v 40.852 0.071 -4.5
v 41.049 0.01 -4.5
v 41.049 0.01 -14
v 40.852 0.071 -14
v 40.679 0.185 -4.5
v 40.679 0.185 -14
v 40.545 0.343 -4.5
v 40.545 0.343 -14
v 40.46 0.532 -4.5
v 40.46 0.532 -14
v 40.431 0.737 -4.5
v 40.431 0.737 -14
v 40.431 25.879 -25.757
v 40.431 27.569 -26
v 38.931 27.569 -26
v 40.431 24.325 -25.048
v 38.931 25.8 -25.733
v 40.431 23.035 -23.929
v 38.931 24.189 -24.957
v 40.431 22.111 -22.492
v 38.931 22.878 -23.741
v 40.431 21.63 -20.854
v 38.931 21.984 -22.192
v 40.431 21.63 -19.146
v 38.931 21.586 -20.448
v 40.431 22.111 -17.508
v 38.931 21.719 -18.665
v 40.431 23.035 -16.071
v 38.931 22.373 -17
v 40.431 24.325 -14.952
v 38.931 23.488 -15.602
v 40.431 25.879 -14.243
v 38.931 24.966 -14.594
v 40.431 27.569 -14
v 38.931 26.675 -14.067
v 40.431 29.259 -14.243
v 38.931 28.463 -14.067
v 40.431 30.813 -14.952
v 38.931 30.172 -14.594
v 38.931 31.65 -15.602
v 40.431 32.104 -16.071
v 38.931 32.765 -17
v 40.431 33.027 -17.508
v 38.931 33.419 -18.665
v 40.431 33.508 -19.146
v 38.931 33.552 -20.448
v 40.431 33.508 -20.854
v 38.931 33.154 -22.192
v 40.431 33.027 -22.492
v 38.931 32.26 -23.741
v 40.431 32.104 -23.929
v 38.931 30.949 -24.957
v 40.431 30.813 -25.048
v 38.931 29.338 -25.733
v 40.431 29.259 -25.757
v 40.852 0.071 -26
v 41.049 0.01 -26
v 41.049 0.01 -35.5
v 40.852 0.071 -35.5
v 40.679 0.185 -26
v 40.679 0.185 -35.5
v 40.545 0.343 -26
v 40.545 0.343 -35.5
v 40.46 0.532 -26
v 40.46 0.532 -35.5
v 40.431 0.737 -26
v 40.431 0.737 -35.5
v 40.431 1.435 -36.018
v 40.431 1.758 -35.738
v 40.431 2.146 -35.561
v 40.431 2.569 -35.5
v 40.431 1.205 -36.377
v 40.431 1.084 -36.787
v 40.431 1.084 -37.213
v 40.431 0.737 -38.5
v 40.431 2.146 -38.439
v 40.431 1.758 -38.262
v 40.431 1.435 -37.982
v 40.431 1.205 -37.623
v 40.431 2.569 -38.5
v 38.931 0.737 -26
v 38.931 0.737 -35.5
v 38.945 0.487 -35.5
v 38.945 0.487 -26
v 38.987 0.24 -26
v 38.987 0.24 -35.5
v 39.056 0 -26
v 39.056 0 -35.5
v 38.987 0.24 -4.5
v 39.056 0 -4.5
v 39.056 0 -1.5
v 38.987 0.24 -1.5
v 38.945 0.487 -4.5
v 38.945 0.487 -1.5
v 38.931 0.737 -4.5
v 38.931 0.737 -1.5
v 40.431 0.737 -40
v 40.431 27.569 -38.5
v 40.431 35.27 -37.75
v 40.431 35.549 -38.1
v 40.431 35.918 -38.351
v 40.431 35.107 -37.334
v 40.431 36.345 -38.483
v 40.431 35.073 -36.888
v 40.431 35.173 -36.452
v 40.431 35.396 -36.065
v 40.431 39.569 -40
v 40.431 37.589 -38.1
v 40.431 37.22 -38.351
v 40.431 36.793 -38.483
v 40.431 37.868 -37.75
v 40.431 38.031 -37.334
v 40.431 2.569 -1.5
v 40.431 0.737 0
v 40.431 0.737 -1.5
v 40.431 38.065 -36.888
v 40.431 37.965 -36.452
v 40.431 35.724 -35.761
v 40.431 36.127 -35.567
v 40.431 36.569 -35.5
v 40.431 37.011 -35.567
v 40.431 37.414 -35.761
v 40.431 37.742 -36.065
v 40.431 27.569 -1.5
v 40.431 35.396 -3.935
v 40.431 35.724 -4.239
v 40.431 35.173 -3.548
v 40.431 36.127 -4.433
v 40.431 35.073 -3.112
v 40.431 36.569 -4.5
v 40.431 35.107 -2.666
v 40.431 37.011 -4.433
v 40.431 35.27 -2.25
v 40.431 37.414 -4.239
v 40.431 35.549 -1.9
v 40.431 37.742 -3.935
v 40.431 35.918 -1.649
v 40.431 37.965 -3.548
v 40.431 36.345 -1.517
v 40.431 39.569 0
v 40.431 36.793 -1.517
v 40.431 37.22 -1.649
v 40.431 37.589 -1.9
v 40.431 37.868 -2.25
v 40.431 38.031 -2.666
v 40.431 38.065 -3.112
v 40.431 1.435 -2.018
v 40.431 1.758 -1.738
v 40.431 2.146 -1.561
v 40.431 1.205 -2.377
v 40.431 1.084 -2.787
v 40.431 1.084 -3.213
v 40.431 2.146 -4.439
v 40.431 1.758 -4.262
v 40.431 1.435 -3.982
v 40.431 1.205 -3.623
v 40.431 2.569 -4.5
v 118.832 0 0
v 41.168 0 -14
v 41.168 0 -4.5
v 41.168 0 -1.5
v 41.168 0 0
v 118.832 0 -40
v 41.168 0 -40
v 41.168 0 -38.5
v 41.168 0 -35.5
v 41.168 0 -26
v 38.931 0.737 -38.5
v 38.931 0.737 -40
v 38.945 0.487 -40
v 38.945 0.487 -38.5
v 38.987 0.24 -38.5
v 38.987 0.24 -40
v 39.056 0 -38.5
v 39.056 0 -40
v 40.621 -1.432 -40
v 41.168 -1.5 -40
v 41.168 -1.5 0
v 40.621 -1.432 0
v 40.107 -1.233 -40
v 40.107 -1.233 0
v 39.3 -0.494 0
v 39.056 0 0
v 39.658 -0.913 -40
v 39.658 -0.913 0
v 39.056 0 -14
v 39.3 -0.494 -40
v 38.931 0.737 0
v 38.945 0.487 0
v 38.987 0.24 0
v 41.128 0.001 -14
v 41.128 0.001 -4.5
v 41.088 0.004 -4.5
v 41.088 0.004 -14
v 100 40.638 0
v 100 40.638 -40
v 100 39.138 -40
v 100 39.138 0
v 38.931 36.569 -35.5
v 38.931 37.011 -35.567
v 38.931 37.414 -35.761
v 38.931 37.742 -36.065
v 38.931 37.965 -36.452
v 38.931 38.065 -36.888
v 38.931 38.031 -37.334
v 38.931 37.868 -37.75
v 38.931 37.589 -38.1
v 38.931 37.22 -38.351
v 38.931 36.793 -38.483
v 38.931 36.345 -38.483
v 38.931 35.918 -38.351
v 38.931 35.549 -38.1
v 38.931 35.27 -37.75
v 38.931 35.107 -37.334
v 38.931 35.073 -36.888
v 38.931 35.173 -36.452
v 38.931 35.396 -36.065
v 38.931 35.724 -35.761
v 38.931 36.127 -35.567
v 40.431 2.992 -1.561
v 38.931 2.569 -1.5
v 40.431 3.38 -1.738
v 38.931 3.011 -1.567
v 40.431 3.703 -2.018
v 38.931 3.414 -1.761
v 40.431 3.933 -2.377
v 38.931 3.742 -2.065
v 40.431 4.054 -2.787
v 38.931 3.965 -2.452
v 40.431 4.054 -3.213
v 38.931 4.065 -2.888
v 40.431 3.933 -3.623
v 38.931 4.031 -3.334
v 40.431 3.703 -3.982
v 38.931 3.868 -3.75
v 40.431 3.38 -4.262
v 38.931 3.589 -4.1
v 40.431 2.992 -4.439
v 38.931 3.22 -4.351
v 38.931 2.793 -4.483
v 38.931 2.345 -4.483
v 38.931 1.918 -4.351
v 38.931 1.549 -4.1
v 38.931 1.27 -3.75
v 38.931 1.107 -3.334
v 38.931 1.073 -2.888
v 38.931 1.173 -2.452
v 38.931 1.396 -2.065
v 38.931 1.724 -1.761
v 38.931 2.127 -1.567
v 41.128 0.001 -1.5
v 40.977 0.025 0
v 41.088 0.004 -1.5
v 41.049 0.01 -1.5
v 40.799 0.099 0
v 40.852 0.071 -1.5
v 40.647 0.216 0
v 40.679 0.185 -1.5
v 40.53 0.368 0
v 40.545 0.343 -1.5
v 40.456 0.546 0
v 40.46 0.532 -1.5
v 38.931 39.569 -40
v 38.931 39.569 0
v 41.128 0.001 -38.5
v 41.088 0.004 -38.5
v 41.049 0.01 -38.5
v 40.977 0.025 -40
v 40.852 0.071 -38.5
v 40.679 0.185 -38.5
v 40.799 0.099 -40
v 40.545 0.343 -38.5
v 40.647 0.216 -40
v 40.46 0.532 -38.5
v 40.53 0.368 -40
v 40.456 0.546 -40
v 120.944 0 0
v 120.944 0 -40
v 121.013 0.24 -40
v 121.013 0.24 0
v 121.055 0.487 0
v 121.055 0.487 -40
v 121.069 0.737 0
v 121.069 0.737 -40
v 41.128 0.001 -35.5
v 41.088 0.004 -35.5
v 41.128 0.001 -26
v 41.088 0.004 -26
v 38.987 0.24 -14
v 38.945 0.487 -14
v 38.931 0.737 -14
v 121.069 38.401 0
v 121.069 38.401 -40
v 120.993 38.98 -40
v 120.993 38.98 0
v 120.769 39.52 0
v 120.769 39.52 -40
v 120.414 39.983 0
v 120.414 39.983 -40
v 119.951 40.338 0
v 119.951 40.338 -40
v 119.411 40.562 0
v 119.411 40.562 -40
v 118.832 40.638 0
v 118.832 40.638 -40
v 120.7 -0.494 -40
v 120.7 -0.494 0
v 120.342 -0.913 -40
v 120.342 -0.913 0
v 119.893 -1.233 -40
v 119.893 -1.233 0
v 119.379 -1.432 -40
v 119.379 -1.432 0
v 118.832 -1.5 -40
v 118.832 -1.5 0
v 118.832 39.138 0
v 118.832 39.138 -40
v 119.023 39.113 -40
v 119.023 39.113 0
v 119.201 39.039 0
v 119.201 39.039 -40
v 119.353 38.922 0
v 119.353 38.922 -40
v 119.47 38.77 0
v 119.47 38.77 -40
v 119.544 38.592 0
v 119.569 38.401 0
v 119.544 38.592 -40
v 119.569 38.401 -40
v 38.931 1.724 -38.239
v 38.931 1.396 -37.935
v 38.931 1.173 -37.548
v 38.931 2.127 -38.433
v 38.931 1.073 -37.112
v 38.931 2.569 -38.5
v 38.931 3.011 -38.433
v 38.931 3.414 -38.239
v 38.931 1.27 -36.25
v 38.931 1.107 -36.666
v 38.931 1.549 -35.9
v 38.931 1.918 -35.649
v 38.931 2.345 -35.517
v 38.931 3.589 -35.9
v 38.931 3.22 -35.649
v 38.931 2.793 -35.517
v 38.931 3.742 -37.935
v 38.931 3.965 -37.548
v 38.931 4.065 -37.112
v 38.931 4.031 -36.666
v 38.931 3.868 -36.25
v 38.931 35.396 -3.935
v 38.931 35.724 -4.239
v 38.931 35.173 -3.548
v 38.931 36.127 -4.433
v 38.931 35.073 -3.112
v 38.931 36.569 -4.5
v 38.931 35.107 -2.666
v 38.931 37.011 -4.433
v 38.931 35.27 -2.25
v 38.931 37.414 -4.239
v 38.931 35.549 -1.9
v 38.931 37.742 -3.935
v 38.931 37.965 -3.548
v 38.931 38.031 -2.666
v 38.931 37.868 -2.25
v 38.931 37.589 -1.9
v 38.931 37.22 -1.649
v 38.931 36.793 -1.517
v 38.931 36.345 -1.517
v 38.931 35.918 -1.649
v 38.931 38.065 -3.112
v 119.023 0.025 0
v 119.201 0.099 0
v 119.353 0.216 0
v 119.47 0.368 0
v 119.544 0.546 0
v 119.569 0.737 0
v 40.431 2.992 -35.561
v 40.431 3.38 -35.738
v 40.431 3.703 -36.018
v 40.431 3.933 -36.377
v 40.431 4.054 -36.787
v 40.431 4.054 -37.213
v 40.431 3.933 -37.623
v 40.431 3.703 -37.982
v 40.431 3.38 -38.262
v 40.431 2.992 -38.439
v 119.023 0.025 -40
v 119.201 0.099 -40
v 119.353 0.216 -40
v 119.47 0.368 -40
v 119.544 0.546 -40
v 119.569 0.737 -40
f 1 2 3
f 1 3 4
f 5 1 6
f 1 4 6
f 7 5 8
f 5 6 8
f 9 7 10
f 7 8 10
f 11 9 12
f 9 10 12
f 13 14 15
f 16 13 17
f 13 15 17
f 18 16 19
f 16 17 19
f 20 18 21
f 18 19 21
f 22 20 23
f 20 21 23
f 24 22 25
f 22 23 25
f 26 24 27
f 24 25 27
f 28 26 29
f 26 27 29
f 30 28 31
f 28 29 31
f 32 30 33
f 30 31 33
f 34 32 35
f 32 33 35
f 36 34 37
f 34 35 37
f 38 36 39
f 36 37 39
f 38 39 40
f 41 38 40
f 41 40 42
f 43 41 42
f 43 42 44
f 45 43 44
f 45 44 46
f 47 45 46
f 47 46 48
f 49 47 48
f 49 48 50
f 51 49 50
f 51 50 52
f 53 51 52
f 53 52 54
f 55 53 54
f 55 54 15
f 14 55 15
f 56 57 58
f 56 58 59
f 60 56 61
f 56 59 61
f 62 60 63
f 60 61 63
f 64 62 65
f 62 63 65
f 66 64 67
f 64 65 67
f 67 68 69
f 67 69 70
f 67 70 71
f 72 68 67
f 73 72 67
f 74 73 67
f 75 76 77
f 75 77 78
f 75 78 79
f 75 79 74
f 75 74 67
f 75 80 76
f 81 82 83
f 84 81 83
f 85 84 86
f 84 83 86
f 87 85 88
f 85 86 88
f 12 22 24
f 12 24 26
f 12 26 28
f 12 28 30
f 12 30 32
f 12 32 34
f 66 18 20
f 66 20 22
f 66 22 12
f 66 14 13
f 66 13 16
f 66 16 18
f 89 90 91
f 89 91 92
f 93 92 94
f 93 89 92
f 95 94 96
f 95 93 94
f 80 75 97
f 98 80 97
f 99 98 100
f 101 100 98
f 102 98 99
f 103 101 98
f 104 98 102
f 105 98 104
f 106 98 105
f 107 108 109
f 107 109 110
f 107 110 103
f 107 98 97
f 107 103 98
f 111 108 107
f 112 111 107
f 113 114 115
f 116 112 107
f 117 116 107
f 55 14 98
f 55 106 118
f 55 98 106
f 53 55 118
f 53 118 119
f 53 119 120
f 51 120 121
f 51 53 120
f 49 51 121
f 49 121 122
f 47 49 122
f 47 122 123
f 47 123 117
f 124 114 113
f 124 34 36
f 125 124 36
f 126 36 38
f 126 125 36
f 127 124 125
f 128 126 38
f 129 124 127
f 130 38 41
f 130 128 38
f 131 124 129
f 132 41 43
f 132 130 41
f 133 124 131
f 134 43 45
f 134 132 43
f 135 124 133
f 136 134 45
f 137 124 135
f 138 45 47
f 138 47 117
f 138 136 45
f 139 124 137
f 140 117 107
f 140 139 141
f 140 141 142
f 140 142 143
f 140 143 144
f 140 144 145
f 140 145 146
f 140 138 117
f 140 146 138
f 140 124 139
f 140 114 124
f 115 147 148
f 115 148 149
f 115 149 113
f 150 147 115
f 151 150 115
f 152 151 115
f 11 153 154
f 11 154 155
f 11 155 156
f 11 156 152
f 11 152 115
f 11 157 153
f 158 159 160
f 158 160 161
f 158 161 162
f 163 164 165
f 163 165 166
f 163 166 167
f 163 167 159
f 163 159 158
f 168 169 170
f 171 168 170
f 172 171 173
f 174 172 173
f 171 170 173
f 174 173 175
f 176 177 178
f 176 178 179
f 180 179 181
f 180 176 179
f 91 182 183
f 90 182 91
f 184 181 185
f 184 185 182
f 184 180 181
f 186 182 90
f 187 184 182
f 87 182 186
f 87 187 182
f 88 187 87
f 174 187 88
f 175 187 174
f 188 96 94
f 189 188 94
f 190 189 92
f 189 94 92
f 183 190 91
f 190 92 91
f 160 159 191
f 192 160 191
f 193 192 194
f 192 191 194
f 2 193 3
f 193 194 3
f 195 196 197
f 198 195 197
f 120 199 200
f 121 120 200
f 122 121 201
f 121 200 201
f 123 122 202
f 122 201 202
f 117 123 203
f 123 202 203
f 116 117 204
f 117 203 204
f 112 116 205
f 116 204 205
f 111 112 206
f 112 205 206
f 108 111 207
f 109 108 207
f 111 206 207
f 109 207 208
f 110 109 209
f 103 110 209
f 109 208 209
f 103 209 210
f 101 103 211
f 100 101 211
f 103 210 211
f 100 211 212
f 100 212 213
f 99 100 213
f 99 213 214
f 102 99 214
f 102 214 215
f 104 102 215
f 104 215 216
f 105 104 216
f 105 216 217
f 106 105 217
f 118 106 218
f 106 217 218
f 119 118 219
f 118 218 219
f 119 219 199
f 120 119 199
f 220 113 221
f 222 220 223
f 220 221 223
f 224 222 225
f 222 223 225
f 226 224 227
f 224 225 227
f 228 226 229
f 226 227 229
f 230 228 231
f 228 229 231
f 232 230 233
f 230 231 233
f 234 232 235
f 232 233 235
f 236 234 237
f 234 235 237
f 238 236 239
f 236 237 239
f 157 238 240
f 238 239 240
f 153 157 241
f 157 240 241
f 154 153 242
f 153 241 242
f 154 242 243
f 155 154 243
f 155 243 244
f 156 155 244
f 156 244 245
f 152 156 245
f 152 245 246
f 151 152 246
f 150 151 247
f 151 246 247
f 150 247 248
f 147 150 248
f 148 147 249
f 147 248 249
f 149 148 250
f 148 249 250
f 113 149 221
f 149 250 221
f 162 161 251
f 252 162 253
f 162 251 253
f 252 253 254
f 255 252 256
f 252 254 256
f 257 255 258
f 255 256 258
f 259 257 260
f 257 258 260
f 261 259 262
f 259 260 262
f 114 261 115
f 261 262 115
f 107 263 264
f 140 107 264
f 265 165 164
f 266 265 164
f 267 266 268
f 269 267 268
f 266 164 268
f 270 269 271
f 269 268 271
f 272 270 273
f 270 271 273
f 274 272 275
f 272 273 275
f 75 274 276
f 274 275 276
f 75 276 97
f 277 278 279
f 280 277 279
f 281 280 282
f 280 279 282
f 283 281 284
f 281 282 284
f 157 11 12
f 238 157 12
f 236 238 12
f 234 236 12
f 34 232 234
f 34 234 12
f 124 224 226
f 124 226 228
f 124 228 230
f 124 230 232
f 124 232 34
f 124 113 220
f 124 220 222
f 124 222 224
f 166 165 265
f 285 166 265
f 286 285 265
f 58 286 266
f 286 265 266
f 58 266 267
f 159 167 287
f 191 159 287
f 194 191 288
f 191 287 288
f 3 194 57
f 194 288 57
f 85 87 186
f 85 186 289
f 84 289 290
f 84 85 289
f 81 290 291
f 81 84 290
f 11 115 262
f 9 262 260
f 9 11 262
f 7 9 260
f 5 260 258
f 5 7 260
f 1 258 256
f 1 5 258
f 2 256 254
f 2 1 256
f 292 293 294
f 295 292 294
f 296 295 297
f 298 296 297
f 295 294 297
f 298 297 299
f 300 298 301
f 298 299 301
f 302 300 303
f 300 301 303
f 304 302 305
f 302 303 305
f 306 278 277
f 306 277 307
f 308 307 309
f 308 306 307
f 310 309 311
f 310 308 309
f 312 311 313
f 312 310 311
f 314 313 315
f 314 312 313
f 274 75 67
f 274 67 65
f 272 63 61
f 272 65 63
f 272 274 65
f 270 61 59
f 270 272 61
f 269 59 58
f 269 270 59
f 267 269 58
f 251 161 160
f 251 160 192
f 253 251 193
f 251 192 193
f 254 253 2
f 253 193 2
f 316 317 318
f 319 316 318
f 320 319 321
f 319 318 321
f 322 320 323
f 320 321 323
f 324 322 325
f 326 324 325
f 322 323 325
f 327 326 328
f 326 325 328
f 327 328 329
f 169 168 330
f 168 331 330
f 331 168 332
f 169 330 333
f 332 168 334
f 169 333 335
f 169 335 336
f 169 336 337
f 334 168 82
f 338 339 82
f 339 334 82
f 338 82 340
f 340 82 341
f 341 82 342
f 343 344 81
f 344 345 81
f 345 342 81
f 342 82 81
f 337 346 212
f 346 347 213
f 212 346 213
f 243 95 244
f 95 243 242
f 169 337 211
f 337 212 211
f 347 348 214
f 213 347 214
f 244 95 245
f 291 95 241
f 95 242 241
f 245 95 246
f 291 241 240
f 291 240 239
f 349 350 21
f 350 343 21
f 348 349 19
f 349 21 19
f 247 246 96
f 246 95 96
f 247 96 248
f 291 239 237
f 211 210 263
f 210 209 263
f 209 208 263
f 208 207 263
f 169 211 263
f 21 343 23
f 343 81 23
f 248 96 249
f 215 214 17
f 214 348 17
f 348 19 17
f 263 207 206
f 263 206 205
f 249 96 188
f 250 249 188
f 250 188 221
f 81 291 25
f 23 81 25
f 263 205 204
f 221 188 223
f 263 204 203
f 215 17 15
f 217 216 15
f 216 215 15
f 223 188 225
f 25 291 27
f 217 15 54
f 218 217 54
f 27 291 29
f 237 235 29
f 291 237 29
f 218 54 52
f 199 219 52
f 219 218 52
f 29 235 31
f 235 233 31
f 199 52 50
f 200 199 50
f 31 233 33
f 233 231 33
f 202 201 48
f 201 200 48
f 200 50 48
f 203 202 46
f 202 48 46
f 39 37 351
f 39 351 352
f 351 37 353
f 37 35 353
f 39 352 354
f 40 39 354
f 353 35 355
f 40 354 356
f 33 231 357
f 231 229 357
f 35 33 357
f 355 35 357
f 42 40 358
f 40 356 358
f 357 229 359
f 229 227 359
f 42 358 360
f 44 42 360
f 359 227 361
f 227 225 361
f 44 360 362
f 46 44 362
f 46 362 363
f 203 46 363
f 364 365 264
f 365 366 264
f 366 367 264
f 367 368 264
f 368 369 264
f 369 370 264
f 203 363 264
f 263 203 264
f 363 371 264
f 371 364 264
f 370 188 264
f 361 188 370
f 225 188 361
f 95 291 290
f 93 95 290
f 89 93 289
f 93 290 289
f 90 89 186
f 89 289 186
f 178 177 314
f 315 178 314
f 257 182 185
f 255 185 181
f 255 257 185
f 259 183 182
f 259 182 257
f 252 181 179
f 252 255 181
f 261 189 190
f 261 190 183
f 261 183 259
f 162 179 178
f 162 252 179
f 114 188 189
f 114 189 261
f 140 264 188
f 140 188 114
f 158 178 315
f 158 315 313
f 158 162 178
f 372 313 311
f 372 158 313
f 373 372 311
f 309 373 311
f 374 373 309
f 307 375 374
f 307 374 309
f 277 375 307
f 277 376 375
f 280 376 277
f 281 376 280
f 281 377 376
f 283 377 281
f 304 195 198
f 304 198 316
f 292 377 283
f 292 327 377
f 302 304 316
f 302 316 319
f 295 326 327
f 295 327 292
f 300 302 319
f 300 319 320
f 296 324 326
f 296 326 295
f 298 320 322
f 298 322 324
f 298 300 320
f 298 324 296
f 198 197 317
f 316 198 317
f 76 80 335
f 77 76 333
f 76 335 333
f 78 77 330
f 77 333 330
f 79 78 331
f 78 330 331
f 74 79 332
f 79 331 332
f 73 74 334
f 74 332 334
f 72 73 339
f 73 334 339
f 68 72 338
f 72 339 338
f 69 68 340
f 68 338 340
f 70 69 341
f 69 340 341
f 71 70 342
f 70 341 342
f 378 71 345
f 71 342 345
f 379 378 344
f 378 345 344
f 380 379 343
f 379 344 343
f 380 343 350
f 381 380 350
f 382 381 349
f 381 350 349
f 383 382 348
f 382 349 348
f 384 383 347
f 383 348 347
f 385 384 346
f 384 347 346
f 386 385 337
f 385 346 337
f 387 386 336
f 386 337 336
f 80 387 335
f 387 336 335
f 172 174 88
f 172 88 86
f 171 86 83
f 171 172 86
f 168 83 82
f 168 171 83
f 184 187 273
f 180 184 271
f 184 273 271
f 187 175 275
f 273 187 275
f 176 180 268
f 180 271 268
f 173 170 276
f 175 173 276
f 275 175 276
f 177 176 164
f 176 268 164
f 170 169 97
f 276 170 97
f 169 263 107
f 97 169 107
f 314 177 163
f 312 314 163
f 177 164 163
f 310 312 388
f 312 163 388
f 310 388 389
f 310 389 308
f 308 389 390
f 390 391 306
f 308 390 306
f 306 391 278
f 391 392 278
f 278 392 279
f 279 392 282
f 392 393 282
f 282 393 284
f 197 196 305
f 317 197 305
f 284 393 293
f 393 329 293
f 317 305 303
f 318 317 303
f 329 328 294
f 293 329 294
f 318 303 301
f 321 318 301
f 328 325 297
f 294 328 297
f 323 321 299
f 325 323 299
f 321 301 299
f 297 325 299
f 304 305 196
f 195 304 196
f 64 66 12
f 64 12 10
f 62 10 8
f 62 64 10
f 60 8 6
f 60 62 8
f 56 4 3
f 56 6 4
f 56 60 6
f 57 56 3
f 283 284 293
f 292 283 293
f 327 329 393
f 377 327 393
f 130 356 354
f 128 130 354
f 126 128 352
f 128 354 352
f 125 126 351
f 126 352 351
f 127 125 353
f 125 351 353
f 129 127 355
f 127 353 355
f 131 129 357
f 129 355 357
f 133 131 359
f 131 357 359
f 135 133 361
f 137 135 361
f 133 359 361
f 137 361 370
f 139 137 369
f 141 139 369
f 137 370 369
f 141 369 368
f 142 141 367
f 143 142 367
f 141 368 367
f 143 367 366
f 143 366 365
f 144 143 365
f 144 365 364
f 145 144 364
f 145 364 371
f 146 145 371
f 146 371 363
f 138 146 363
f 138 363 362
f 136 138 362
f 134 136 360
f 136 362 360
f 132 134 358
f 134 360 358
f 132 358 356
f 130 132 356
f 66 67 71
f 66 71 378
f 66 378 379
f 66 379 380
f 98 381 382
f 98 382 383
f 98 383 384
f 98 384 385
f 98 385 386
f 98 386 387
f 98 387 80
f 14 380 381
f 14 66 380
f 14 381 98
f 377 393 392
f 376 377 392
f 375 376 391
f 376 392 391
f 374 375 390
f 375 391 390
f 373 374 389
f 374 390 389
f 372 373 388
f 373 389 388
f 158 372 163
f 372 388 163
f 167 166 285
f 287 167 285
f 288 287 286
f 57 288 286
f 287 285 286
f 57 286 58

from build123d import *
from build123d.topology import SkipClean

# Parameters (mm, degrees)
SKETCH1_R               = 6
SKETCH1_R_2             = 1.5
BASE_FLANGE2_DEPTH      = 1.5
SKETCHED_START          = -40
SKETCHED_BEND1_DEPTH    = 40
SKETCHED_BEND1_2_DEPTH  = 40
SKETCHED_START_2        = -35.4999999
SKETCHED_BEND1_3_DEPTH  = 9.4999998
SKETCHED_START_3        = -13.9999999
SKETCHED_BEND1_4_DEPTH  = 9.4999998
SKETCHED_BEND1_5_DEPTH  = 1.4999999
SKETCHED_START_4        = -1.4999999
SKETCHED_BEND1_6_DEPTH  = 1.4999999
SKETCHED_START_5        = 38.93097291
SKETCHED_BEND1_7_DEPTH  = 1.5
SKETCHED_START_6        = 40.43097291
SKETCHED_BEND1_8_DEPTH  = 0.618240168
SKETCHED_START_7        = -38.5000001
SKETCHED_BEND1_9_DEPTH  = 37.00000011
SKETCHED_BEND1_10_DEPTH = 37.00000011


with BuildPart() as part:
    # Base-Flange2: sheet metal written as solids
    # Sketch1 → Base-Flange2 (new body)
    with BuildSketch(Plane(origin=(0, 0, 0), x_dir=(1, 0, 0), z_dir=(0, 1, 0))):
        Polygon((0, 0), (40, 0), (120, 0), (160, 0), (180, 0), (180, 40), (160, 40), (120, 40), (40, 40), (0, 40), align=None)
        with Locations(Location((12, 20, 0), (0, 0, 270))):
            Circle(SKETCH1_R, mode=Mode.SUBTRACT)
        with Locations(Location((3, 37, 0), (0, 0, 270))):
            Circle(SKETCH1_R_2, mode=Mode.SUBTRACT)
        with Locations(Location((37, 37, 0), (0, 0, 270))):
            Circle(SKETCH1_R_2, mode=Mode.SUBTRACT)
        with Locations(Location((37, 3, 0), (0, 0, 270))):
            Circle(SKETCH1_R_2, mode=Mode.SUBTRACT)
        with Locations(Location((3, 3, 0), (0, 0, 270))):
            Circle(SKETCH1_R_2, mode=Mode.SUBTRACT)
    extrude(amount=-BASE_FLANGE2_DEPTH)

    # Sketched Bend1: read off the stored shape, not the designer's step
    # Sketched Bend1 outline → Sketched Bend1 (cut)
    with BuildSketch(Plane.XY.offset(SKETCHED_START)):
        with BuildLine():
            Line((180, 0), (120.944250946, 0))
            ThreePointArc((120.944250946, 0), (120.127591172, -1.086838938), (118.83242709, -1.5))
            Line((118.83242709, -1.5), (180, -1.5))
            Line((180, -1.5), (180, 0))
        make_face()
        with BuildLine():
            Line((0, -1.5), (41.16757291, -1.5))
            ThreePointArc((41.16757291, -1.5), (39.872408828, -1.086838938), (39.055749054, 0))
            Line((39.055749054, 0), (0, 0))
            Line((0, 0), (0, -1.5))
        make_face()
    extrude(amount=SKETCHED_BEND1_DEPTH, mode=Mode.SUBTRACT)

    # Sketched Bend1 2 outline → Sketched Bend1 2 (add)
    with BuildSketch(Plane.XY.offset(SKETCHED_START)):
        with BuildLine():
            ThreePointArc((120.944250946, 0), (121.037612433, 0.363053267), (121.06902709, 0.7366))
            Line((121.06902709, 0.7366), (121.06902709, 38.401454181))
            ThreePointArc((121.06902709, 38.401454181), (120.413942116, 39.982969207), (118.83242709, 40.638054181))
            Line((118.83242709, 40.638054181), (100, 40.638054181))
            Line((100, 40.638054181), (100, 39.138054181))
            Line((100, 39.138054181), (118.83242709, 39.138054181))
            ThreePointArc((118.83242709, 39.138054181), (119.353281945, 38.922309036), (119.56902709, 38.401454181))
            Line((119.56902709, 38.401454181), (119.56902709, 0.7366))
            ThreePointArc((119.56902709, 0.7366), (119.353281945, 0.215745145), (118.83242709, 0))
            Line((118.83242709, 0), (120.944250946, 0))
        make_face()
    extrude(amount=SKETCHED_BEND1_2_DEPTH)

    # Sketched Bend1 3 outline → Sketched Bend1 3 (add)
    with BuildSketch(Plane.XY.offset(SKETCHED_START_2)):
        with BuildLine():
            Line((39.055749054, 0), (41.16757291, 0))
            ThreePointArc((41.16757291, 0), (40.646718055, 0.215745145), (40.43097291, 0.7366))
            Line((40.43097291, 0.7366), (40.43097291, 39.56902709))
            Line((40.43097291, 39.56902709), (38.93097291, 39.56902709))
            Line((38.93097291, 39.56902709), (38.93097291, 0.7366))
            ThreePointArc((38.93097291, 0.7366), (38.962387567, 0.363053267), (39.055749054, 0))
        make_face()
    extrude(amount=SKETCHED_BEND1_3_DEPTH)

    # Sketched Bend1 4 outline → Sketched Bend1 4 (add)
    with BuildSketch(Plane.XY.offset(SKETCHED_START_3)):
        with BuildLine():
            Line((39.055749054, 0), (41.16757291, 0))
            ThreePointArc((41.16757291, 0), (40.646718055, 0.215745145), (40.43097291, 0.7366))
            Line((40.43097291, 0.7366), (40.43097291, 39.56902709))
            Line((40.43097291, 39.56902709), (38.93097291, 39.56902709))
            Line((38.93097291, 39.56902709), (38.93097291, 0.7366))
            ThreePointArc((38.93097291, 0.7366), (38.962387567, 0.363053267), (39.055749054, 0))
        make_face()
    extrude(amount=SKETCHED_BEND1_4_DEPTH)

    # Sketched Bend1 5 outline → Sketched Bend1 5 (add)
    with BuildSketch(Plane.XY.offset(SKETCHED_START)):
        with BuildLine():
            Line((39.055749054, 0), (41.16757291, 0))
            ThreePointArc((41.16757291, 0), (40.646718055, 0.215745145), (40.43097291, 0.7366))
            Line((40.43097291, 0.7366), (40.43097291, 39.56902709))
            Line((40.43097291, 39.56902709), (38.93097291, 39.56902709))
            Line((38.93097291, 39.56902709), (38.93097291, 0.7366))
            ThreePointArc((38.93097291, 0.7366), (38.962387567, 0.363053267), (39.055749054, 0))
        make_face()
    extrude(amount=SKETCHED_BEND1_5_DEPTH)

    # Sketched Bend1 6 outline → Sketched Bend1 6 (add)
    with BuildSketch(Plane.XY.offset(SKETCHED_START_4)):
        with BuildLine():
            Line((39.055749054, 0), (41.16757291, 0))
            ThreePointArc((41.16757291, 0), (40.646718055, 0.215745145), (40.43097291, 0.7366))
            Line((40.43097291, 0.7366), (40.43097291, 39.56902709))
            Line((40.43097291, 39.56902709), (38.93097291, 39.56902709))
            Line((38.93097291, 39.56902709), (38.93097291, 0.7366))
            ThreePointArc((38.93097291, 0.7366), (38.962387567, 0.363053267), (39.055749054, 0))
        make_face()
    extrude(amount=SKETCHED_BEND1_6_DEPTH)

    # Sketched Bend1 7 outline → Sketched Bend1 7 (add)
    with BuildSketch(Plane.YZ.offset(SKETCHED_START_5)):
        with BuildLine():
            Line((36.56902709, -38.5), (39.56902709, -38.5000001))
            Line((39.56902709, -38.5000001), (39.56902709, -35.4999999))
            Line((39.56902709, -35.4999999), (36.56902709, -35.5))
            ThreePointArc((36.56902709, -35.5), (38.06902709, -37), (36.56902709, -38.5))
        make_face()
        with BuildLine():
            Line((2.569027031, -38.5), (36.56902709, -38.5))
            ThreePointArc((36.56902709, -38.5), (35.06902709, -37), (36.56902709, -35.5))
            Line((36.56902709, -35.5), (2.56902709, -35.5))
            ThreePointArc((2.56902709, -35.5), (4.06902709, -37.000000029), (2.569027031, -38.5))
        make_face()
        with BuildLine():
            Line((27.56902709, -26), (39.56902709, -26.0000001))
            Line((39.56902709, -26.0000001), (39.56902709, -13.9999999))
            Line((39.56902709, -13.9999999), (27.56902709, -14))
            ThreePointArc((27.56902709, -14), (33.56902709, -20), (27.56902709, -26))
        make_face()
        with BuildLine():
            Line((0, -38.5000001), (2.569027031, -38.5))
            ThreePointArc((2.569027031, -38.5), (1.06902709, -36.999999971), (2.56902709, -35.5))
            Line((2.56902709, -35.5), (0, -35.4999999))
            Line((0, -35.4999999), (0, -38.5000001))
        make_face()
        with BuildLine():
            Line((0, -26.0000001), (27.56902709, -26))
            ThreePointArc((27.56902709, -26), (21.56902709, -20), (27.56902709, -14))
            Line((27.56902709, -14), (0, -13.9999999))
            Line((0, -13.9999999), (0, -26.0000001))
        make_face()
        with BuildLine():
            Line((36.56902709, -4.5), (39.56902709, -4.5000001))
            Line((39.56902709, -4.5000001), (39.56902709, -1.4999999))
            Line((39.56902709, -1.4999999), (36.56902709, -1.5))
            ThreePointArc((36.56902709, -1.5), (38.06902709, -3), (36.56902709, -4.5))
        make_face()
        with BuildLine():
            Line((2.56902709, -4.5), (36.56902709, -4.5))
            ThreePointArc((36.56902709, -4.5), (35.06902709, -3), (36.56902709, -1.5))
            Line((36.56902709, -1.5), (2.569027095, -1.5))
            ThreePointArc((2.569027095, -1.5), (4.06902709, -3.000000002), (2.56902709, -4.5))
        make_face()
        with BuildLine():
            Line((0, -4.5000001), (2.56902709, -4.5))
            ThreePointArc((2.56902709, -4.5), (1.06902709, -2.999999998), (2.569027095, -1.5))
            Line((2.569027095, -1.5), (0, -1.4999999))
            Line((0, -1.4999999), (0, -4.5000001))
        make_face()
    extrude(amount=SKETCHED_BEND1_7_DEPTH)

    # Sketched Bend1 8 outline → Sketched Bend1 8 (add)
    with BuildSketch(Plane.YZ.offset(SKETCHED_START_6)):
        with BuildLine():
            Line((0, -38.5000001), (2.569027031, -38.5))
            ThreePointArc((2.569027031, -38.5), (1.06902709, -36.999999971), (2.56902709, -35.5))
            Line((2.56902709, -35.5), (0, -35.4999999))
            Line((0, -35.4999999), (0, -38.5000001))
        make_face()
        with BuildLine():
            Line((0, -26.0000001), (27.56902709, -26))
            ThreePointArc((27.56902709, -26), (21.56902709, -20), (27.56902709, -14))
            Line((27.56902709, -14), (0, -13.9999999))
            Line((0, -13.9999999), (0, -26.0000001))
        make_face()
        with BuildLine():
            Line((0, -4.5000001), (2.56902709, -4.5))
            ThreePointArc((2.56902709, -4.5), (1.06902709, -2.999999998), (2.569027095, -1.5))
            Line((2.569027095, -1.5), (0, -1.4999999))
            Line((0, -1.4999999), (0, -4.5000001))
        make_face()
    extrude(amount=SKETCHED_BEND1_8_DEPTH)

    # Sketched Bend1 9 outline → Sketched Bend1 9 (cut)
    with SkipClean():  # the faces are left unmerged after this step: merging them gives an invalid solid
        with BuildSketch(Plane.XY.offset(SKETCHED_START_7)):
            with BuildLine():
                ThreePointArc((40.43097291, 0.7366), (40.606429696, 0.259423037), (41.049213078, 0.009571452))
                Line((41.049213078, 0.009571452), (41.049213078, 27.56902709))
                Line((41.049213078, 27.56902709), (40.43097291, 27.56902709))
                Line((40.43097291, 27.56902709), (40.43097291, 0.7366))
            make_face()
            with BuildLine():
                ThreePointArc((39.055749054, 0), (38.962387567, 0.363053267), (38.93097291, 0.7366))
                Line((38.93097291, 0.7366), (38.93097291, 0))
                Line((38.93097291, 0), (39.055749054, 0))
            make_face()
        extrude(amount=SKETCHED_BEND1_9_DEPTH, mode=Mode.SUBTRACT)

    # Sketched Bend1 10 outline → Sketched Bend1 10 (add)
    with SkipClean():  # the faces are left unmerged after this step: merging them gives an invalid solid
        with BuildSketch(Plane.XY.offset(SKETCHED_START_7)):
            with BuildLine():
                ThreePointArc((41.16757291, 0), (41.108199805, 0.002396762), (41.049213078, 0.009571452))
                Line((41.049213078, 0.009571452), (41.049213078, 0))
                Line((41.049213078, 0), (41.16757291, 0))
            make_face()
        extrude(amount=SKETCHED_BEND1_10_DEPTH)


solid = part.part
